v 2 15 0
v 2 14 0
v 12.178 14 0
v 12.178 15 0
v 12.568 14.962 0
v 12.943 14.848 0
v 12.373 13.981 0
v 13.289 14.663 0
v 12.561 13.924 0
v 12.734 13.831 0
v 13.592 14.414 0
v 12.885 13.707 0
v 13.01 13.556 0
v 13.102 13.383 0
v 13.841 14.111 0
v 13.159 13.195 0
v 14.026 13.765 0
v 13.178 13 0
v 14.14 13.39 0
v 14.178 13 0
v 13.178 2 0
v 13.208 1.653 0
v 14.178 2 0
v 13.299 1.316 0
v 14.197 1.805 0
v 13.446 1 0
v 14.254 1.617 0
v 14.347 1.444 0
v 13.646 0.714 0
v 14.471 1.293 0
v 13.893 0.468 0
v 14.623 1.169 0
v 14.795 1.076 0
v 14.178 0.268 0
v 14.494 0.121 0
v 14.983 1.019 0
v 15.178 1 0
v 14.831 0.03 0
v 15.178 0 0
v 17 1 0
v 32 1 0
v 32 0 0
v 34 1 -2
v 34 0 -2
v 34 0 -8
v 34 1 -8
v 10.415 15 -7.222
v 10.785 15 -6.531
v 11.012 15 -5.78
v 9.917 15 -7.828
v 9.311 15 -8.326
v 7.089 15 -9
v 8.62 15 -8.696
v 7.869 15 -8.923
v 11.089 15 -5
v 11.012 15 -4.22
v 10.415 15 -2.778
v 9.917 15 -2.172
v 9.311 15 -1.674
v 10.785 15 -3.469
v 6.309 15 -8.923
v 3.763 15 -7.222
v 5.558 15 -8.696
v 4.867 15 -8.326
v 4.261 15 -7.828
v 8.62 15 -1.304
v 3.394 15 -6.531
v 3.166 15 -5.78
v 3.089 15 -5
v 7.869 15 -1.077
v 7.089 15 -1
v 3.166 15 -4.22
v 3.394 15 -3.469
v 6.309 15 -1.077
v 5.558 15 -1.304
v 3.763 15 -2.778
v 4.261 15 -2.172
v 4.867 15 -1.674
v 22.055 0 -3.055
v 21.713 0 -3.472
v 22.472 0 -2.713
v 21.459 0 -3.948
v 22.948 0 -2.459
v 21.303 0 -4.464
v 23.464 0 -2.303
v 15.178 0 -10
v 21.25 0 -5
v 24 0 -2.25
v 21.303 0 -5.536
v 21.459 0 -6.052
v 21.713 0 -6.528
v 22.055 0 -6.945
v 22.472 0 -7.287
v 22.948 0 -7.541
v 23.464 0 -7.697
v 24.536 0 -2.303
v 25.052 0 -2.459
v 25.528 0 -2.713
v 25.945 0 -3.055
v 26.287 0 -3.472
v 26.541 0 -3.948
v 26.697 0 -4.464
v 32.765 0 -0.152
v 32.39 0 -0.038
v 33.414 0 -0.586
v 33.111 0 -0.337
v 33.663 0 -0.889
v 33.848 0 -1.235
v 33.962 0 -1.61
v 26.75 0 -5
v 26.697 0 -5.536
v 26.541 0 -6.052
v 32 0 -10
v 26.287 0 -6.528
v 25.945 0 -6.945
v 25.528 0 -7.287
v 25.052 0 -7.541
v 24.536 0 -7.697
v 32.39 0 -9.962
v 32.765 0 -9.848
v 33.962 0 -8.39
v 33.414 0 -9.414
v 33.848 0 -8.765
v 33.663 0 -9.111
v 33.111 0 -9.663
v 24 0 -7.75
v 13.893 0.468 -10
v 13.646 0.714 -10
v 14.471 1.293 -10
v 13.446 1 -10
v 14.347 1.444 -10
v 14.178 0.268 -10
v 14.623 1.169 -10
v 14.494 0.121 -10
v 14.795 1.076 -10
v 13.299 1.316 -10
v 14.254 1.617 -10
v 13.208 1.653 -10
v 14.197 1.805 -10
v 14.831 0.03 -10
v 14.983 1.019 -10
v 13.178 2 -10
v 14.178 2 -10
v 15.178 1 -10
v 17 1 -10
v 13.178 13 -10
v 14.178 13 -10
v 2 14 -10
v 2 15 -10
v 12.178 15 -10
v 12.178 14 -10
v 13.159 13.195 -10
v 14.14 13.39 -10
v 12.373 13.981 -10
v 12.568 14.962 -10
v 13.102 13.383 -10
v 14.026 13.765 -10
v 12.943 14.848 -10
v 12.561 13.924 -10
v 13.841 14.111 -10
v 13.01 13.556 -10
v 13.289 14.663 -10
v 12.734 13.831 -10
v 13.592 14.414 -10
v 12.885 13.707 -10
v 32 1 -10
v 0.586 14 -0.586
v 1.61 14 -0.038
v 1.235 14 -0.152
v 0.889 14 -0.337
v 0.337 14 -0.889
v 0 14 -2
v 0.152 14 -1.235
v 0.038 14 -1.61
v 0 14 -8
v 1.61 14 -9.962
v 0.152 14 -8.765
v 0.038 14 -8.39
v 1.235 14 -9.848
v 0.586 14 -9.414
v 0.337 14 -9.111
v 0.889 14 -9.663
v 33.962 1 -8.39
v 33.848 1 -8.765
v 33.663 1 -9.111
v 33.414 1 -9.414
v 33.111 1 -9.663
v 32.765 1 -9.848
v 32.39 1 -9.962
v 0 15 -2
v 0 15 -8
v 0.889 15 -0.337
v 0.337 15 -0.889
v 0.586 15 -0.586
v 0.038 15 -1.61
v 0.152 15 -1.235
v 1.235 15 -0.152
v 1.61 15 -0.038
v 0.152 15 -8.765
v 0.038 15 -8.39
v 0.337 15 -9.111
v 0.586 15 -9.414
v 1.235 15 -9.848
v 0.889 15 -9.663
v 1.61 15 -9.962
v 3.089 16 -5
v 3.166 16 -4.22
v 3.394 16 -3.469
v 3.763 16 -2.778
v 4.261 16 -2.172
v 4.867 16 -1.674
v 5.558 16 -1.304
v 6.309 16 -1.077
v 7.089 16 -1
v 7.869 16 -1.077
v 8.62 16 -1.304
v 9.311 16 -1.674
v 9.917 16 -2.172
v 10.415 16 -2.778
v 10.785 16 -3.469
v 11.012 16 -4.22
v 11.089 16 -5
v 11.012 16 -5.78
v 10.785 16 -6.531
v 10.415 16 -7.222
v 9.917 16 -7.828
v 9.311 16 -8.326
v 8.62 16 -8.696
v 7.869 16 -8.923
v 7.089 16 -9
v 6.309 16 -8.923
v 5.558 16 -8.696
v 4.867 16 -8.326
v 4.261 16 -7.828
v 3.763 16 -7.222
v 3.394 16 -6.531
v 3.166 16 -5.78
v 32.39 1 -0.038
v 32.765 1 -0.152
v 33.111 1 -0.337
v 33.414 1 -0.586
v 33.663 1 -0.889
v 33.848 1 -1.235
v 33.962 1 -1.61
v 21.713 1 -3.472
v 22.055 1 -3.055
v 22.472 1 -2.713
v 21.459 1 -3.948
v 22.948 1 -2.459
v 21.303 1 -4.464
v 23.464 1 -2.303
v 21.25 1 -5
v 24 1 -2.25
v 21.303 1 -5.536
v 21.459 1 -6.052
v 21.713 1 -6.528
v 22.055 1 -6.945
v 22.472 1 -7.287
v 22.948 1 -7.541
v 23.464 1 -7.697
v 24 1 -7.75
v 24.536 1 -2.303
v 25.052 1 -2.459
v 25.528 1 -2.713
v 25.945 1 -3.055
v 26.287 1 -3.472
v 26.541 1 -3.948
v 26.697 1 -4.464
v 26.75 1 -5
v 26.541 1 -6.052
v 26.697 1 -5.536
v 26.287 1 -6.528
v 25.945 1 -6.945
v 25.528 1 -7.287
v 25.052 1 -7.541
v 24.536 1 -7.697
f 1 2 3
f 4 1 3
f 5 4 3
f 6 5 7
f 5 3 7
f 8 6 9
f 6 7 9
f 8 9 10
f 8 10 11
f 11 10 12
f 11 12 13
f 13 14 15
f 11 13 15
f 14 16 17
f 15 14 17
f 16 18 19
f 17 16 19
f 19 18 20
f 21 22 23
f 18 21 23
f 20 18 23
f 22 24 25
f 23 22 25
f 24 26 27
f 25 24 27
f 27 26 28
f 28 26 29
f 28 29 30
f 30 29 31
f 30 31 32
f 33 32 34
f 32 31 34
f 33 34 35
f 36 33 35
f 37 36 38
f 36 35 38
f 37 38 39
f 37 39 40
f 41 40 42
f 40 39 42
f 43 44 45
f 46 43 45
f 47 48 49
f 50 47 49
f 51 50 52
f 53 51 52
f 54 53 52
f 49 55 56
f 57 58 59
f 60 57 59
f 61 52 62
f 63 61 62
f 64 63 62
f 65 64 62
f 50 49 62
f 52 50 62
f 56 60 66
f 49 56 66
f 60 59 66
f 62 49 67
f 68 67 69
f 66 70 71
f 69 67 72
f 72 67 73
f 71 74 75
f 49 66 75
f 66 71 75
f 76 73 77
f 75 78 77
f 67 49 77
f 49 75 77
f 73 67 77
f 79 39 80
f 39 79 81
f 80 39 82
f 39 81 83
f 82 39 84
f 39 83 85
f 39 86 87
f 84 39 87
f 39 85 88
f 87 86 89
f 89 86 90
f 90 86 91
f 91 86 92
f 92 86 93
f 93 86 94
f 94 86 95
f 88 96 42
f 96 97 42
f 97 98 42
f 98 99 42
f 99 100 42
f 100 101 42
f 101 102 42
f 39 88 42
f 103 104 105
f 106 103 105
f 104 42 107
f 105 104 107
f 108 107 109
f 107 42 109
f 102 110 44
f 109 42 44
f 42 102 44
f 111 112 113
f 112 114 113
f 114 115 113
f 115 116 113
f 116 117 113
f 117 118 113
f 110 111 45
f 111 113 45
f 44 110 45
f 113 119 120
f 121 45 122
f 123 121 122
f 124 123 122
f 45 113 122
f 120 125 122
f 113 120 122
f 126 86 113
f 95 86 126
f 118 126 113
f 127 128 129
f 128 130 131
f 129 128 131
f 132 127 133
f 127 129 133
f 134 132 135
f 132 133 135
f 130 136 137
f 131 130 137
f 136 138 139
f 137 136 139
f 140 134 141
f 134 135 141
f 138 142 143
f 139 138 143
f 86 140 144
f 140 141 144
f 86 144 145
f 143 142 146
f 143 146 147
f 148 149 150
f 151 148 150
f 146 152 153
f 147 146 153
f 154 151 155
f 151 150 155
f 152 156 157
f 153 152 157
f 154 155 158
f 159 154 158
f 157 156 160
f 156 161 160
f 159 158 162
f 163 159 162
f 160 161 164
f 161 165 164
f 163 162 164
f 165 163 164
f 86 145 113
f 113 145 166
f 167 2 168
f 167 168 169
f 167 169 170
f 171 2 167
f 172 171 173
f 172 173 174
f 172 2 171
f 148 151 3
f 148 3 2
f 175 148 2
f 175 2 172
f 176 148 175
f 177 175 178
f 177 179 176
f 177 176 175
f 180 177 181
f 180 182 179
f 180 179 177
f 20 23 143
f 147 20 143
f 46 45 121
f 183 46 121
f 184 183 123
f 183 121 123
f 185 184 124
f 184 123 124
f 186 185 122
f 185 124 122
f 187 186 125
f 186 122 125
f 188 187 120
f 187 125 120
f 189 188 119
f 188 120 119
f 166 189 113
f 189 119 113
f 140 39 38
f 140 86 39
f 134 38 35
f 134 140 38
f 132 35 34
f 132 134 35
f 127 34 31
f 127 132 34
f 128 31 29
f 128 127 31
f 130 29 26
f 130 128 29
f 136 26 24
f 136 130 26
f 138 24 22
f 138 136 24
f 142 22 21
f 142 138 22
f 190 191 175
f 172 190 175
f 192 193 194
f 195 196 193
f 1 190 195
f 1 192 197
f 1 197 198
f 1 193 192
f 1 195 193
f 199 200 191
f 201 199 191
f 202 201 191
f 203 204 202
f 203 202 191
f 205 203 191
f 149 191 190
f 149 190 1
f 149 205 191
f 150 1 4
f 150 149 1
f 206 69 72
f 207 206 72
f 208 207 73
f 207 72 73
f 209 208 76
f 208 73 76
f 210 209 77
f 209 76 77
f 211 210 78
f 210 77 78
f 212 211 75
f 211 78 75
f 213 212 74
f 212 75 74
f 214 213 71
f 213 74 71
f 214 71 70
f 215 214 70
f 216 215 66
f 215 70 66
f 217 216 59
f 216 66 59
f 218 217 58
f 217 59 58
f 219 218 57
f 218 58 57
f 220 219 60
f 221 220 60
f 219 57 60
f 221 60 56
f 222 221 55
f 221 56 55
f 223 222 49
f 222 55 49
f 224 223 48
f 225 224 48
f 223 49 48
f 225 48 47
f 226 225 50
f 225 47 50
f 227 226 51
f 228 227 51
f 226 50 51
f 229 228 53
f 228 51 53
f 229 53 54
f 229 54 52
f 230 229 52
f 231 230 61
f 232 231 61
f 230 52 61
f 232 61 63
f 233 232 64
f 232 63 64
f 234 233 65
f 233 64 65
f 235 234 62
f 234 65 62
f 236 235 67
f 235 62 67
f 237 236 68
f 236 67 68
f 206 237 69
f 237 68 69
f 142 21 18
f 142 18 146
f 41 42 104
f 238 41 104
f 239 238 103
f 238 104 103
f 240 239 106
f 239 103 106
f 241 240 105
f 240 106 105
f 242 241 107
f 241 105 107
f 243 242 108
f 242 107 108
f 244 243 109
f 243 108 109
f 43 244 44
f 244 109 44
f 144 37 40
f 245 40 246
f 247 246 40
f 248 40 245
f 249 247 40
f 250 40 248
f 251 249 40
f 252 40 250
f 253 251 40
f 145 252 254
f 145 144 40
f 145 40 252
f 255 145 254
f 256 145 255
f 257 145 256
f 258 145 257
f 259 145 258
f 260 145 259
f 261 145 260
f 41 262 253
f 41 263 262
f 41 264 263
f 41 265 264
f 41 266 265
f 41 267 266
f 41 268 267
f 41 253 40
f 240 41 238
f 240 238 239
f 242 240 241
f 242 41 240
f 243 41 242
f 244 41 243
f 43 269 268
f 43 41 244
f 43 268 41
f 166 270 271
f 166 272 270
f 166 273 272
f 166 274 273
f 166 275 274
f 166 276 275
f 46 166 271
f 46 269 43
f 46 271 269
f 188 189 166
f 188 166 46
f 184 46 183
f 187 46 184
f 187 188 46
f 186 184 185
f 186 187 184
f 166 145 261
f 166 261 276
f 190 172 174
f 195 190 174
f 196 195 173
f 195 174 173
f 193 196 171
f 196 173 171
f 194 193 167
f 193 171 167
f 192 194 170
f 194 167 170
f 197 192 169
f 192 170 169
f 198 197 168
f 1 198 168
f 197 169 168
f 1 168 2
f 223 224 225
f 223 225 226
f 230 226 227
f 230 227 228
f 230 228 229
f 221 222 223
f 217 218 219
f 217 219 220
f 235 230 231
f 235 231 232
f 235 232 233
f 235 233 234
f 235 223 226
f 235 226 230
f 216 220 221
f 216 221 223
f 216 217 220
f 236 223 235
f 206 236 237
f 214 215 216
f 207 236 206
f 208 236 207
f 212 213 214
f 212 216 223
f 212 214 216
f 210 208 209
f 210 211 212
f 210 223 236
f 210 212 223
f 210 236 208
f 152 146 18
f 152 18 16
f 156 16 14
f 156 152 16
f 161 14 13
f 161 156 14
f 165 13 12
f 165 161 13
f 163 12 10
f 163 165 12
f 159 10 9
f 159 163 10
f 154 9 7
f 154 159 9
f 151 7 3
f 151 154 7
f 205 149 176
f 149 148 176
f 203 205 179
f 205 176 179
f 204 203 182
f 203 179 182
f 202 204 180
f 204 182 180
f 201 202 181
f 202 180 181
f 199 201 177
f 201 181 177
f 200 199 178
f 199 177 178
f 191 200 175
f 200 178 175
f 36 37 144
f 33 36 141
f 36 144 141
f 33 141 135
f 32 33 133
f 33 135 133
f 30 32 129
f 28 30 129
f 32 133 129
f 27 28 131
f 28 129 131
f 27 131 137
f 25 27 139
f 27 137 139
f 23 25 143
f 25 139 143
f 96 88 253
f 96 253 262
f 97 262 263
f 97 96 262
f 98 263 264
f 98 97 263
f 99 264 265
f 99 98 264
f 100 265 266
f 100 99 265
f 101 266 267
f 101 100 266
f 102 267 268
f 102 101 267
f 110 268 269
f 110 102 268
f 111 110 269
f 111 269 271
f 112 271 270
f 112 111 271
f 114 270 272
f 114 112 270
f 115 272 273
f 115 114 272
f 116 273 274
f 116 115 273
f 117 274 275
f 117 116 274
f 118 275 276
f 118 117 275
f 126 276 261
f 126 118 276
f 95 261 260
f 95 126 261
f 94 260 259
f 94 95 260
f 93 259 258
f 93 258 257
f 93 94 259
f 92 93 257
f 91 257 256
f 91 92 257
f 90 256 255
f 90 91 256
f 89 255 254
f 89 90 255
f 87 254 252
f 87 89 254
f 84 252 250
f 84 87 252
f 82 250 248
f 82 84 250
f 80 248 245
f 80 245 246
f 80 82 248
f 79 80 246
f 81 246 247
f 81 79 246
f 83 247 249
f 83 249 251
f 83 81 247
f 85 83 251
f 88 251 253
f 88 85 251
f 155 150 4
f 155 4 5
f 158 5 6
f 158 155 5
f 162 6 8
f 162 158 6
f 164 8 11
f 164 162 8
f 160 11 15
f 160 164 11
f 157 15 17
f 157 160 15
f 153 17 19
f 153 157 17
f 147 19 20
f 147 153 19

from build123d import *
from build123d.topology import SkipClean

# Parameters (mm, degrees)
SKETCH2_R           = 2.75
BASE_FLANGE1_DEPTH  = 1
JOG1_START          = -10
JOG1_DEPTH          = 10
JOG1_START_2        = -8
JOG1_2_DEPTH        = 6
JOG1_START_3        = 13
JOG1_3_DEPTH        = 1.976704963
JOG1_START_4        = 1
JOG1_4_OUTLINE_W    = 1
JOG1_4_OUTLINE_H    = 2
JOG1_4_DEPTH        = 12.160683996
JOG1_START_5        = 14
JOG1_5_DEPTH        = 1
JOG1_6_DEPTH        = 10
JOG1_7_DEPTH        = 10
SKETCH8_R           = 4
BOSS_EXTRUDE2_DEPTH = 1


with BuildPart() as part:
    # Base-Flange1: sheet metal written as solids
    # Sketch2 → Base-Flange1 (new body)
    with BuildSketch(Plane(origin=(0, 0, 0), x_dir=(1, 0, 0), z_dir=(0, 1, 0))):
        with BuildLine():
            Line((2, 0), (32, 0))
            ThreePointArc((32, 0), (33.414213562, 0.585786438), (34, 2))
            Line((34, 2), (34, 8))
            ThreePointArc((34, 8), (33.414213562, 9.414213562), (32, 10))
            Line((32, 10), (2, 10))
            ThreePointArc((2, 10), (0.585786438, 9.414213562), (0, 8))
            Line((0, 8), (0, 2))
            ThreePointArc((0, 2), (0.585786438, 0.585786438), (2, 0))
        make_face()
        with Locations(Location((24, 5, 0), (0, 0, 270))):
            Circle(SKETCH2_R, mode=Mode.SUBTRACT)
    extrude(amount=BASE_FLANGE1_DEPTH)

    # Jog1: read off the stored shape, not the designer's step
    # Jog1 outline → Jog1 (cut)
    with BuildSketch(Plane.XY.offset(JOG1_START)):
        with BuildLine():
            ThreePointArc((15.178097245, 0), (14.178097245, 0.267949193), (13.446046438, 1))
            Line((13.446046438, 1), (0, 1))
            Line((0, 1), (0, 0))
            Line((0, 0), (15.178097245, 0))
        make_face()
    extrude(amount=JOG1_DEPTH, mode=Mode.SUBTRACT)

    # Jog1 2 outline → Jog1 2 (add)
    with BuildSketch(Plane.XY.offset(JOG1_START_2)):
        with BuildLine():
            Line((14.178097245, 2), (14.178097245, 13))
            ThreePointArc((14.178097245, 13), (13.592310807, 14.414213562), (12.178097245, 15))
            Line((12.178097245, 15), (0, 15))
            Line((0, 15), (0, 14))
            Line((0, 14), (12.178097245, 14))
            ThreePointArc((12.178097245, 14), (12.885204026, 13.707106781), (13.178097245, 13))
            Line((13.178097245, 13), (13.178097245, 2))
            ThreePointArc((13.178097245, 2), (13.246245593, 1.48236191), (13.446046438, 1))
            Line((13.446046438, 1), (15.178097245, 1))
            ThreePointArc((15.178097245, 1), (14.470990464, 1.292893219), (14.178097245, 2))
        make_face()
    extrude(amount=JOG1_2_DEPTH)

    # Jog1 3 outline → Jog1 3 (add)
    with BuildSketch(Plane(origin=(0, 0, 0), x_dir=(1, 0, 0), z_dir=(0, 1, 0)).offset(JOG1_START_3)):
        with BuildLine():
            Line((14.178097245, 0), (14.178097245, 2))
            Line((14.178097245, 2), (0, 2))
            ThreePointArc((0, 2), (0.585786438, 0.585786438), (2, 0))
            Line((2, 0), (14.178097245, 0))
        make_face()
        with BuildLine():
            Line((14.178097245, 8), (14.178097245, 10))
            Line((14.178097245, 10), (2, 10))
            ThreePointArc((2, 10), (0.585786438, 9.414213562), (0, 8))
            Line((0, 8), (14.178097245, 8))
        make_face()
    extrude(amount=JOG1_3_DEPTH)

    # Jog1 4 outline → Jog1 4 (add)
    with BuildSketch(Plane(origin=(0, 0, 0), x_dir=(1, 0, 0), z_dir=(0, 1, 0)).offset(JOG1_START_4)):
        with Locations((13.678097245, 1)):
            Rectangle(JOG1_4_OUTLINE_W, JOG1_4_OUTLINE_H)
        with Locations((13.678097245, 9)):
            Rectangle(JOG1_4_OUTLINE_W, JOG1_4_OUTLINE_H)
    extrude(amount=JOG1_4_DEPTH)

    # Jog1 5 outline → Jog1 5 (add)
    with BuildSketch(Plane(origin=(0, 0, 0), x_dir=(1, 0, 0), z_dir=(0, 1, 0)).offset(JOG1_START_5)):
        with BuildLine():
            Line((2, 0), (13.178097245, 0))
            Line((13.178097245, 0), (13.178097245, 2))
            Line((13.178097245, 2), (0, 2))
            ThreePointArc((0, 2), (0.585786438, 0.585786438), (2, 0))
        make_face()
        with BuildLine():
            Line((0, 8), (13.178097245, 8))
            Line((13.178097245, 8), (13.178097245, 10))
            Line((13.178097245, 10), (2, 10))
            ThreePointArc((2, 10), (0.585786438, 9.414213562), (0, 8))
        make_face()
    extrude(amount=JOG1_5_DEPTH)

    # Jog1 6 outline → Jog1 6 (cut)
    with SkipClean():  # the faces are left unmerged after this step: merging them gives an invalid solid
        with BuildSketch(Plane.XY.offset(JOG1_START)):
            with BuildLine():
                Line((14.178097245, 13), (14.178097245, 14.976704963))
                Line((14.178097245, 14.976704963), (13.178097245, 14.976704963))
                Line((13.178097245, 14.976704963), (13.178097245, 15))
                Line((13.178097245, 15), (13.178097236, 16))
                Line((13.178097236, 16), (-1, 16))
                Line((-1, 16), (-1, 15.000000008))
                Line((-1, 15.000000008), (12.178097245, 15))
                ThreePointArc((12.178097245, 15), (13.592310807, 14.414213562), (14.178097245, 13))
            make_face()
            with BuildLine():
                Line((14.178097254, -1), (14.178097249, 0.267949191))
                ThreePointArc((14.178097249, 0.267949191), (13.763883685, 0.585786436), (13.446046438, 1))
                ThreePointArc((13.446046438, 1), (13.246245593, 1.48236191), (13.178097245, 2))
                Line((13.178097245, 2), (13.178097245, 13))
                ThreePointArc((13.178097245, 13), (12.885204026, 13.707106781), (12.178097245, 14))
                Line((12.178097245, 14), (-1, 14))
                Line((-1, 14), (-1, -1))
                Line((-1, -1), (14.178097254, -1))
            make_face()
        extrude(amount=JOG1_6_DEPTH, mode=Mode.SUBTRACT)
    add(part.part.scale(1), mode=Mode.REPLACE)  # the faces are merged on a copy

    # Jog1 7 outline → Jog1 7 (add)
    with SkipClean():  # the faces are left unmerged after this step: merging them gives an invalid solid
        with BuildSketch(Plane.XY.offset(JOG1_START)):
            with BuildLine():
                ThreePointArc((15.178097245, 1), (14.470990464, 1.292893219), (14.178097245, 2))
                Line((14.178097245, 2), (14.178097245, 1))
                Line((14.178097245, 1), (14.178097249, 0.267949191))
                ThreePointArc((14.178097249, 0.267949191), (14.660459157, 0.068148347), (15.178097245, 0))
                Line((15.178097245, 0), (17, -1e-09))
                Line((17, -1e-09), (17, 0.999999999))
                Line((17, 0.999999999), (15.178097245, 1))
            make_face()
        extrude(amount=JOG1_7_DEPTH)
    add(part.part.scale(1), mode=Mode.REPLACE)  # the faces are merged on a copy


with BuildPart() as body_2:
    # Sketch8 → Boss-Extrude2 (new body)
    with BuildSketch(Plane(origin=(0, 15, 0), x_dir=(1, 0, 0), z_dir=(0, 1, 0))):
        with Locations(Location((7.089048623, 5, 0), (0, 0, 180))):
            Circle(SKETCH8_R)
    extrude(amount=BOSS_EXTRUDE2_DEPTH)


solid = Compound([part.part, body_2.part])
